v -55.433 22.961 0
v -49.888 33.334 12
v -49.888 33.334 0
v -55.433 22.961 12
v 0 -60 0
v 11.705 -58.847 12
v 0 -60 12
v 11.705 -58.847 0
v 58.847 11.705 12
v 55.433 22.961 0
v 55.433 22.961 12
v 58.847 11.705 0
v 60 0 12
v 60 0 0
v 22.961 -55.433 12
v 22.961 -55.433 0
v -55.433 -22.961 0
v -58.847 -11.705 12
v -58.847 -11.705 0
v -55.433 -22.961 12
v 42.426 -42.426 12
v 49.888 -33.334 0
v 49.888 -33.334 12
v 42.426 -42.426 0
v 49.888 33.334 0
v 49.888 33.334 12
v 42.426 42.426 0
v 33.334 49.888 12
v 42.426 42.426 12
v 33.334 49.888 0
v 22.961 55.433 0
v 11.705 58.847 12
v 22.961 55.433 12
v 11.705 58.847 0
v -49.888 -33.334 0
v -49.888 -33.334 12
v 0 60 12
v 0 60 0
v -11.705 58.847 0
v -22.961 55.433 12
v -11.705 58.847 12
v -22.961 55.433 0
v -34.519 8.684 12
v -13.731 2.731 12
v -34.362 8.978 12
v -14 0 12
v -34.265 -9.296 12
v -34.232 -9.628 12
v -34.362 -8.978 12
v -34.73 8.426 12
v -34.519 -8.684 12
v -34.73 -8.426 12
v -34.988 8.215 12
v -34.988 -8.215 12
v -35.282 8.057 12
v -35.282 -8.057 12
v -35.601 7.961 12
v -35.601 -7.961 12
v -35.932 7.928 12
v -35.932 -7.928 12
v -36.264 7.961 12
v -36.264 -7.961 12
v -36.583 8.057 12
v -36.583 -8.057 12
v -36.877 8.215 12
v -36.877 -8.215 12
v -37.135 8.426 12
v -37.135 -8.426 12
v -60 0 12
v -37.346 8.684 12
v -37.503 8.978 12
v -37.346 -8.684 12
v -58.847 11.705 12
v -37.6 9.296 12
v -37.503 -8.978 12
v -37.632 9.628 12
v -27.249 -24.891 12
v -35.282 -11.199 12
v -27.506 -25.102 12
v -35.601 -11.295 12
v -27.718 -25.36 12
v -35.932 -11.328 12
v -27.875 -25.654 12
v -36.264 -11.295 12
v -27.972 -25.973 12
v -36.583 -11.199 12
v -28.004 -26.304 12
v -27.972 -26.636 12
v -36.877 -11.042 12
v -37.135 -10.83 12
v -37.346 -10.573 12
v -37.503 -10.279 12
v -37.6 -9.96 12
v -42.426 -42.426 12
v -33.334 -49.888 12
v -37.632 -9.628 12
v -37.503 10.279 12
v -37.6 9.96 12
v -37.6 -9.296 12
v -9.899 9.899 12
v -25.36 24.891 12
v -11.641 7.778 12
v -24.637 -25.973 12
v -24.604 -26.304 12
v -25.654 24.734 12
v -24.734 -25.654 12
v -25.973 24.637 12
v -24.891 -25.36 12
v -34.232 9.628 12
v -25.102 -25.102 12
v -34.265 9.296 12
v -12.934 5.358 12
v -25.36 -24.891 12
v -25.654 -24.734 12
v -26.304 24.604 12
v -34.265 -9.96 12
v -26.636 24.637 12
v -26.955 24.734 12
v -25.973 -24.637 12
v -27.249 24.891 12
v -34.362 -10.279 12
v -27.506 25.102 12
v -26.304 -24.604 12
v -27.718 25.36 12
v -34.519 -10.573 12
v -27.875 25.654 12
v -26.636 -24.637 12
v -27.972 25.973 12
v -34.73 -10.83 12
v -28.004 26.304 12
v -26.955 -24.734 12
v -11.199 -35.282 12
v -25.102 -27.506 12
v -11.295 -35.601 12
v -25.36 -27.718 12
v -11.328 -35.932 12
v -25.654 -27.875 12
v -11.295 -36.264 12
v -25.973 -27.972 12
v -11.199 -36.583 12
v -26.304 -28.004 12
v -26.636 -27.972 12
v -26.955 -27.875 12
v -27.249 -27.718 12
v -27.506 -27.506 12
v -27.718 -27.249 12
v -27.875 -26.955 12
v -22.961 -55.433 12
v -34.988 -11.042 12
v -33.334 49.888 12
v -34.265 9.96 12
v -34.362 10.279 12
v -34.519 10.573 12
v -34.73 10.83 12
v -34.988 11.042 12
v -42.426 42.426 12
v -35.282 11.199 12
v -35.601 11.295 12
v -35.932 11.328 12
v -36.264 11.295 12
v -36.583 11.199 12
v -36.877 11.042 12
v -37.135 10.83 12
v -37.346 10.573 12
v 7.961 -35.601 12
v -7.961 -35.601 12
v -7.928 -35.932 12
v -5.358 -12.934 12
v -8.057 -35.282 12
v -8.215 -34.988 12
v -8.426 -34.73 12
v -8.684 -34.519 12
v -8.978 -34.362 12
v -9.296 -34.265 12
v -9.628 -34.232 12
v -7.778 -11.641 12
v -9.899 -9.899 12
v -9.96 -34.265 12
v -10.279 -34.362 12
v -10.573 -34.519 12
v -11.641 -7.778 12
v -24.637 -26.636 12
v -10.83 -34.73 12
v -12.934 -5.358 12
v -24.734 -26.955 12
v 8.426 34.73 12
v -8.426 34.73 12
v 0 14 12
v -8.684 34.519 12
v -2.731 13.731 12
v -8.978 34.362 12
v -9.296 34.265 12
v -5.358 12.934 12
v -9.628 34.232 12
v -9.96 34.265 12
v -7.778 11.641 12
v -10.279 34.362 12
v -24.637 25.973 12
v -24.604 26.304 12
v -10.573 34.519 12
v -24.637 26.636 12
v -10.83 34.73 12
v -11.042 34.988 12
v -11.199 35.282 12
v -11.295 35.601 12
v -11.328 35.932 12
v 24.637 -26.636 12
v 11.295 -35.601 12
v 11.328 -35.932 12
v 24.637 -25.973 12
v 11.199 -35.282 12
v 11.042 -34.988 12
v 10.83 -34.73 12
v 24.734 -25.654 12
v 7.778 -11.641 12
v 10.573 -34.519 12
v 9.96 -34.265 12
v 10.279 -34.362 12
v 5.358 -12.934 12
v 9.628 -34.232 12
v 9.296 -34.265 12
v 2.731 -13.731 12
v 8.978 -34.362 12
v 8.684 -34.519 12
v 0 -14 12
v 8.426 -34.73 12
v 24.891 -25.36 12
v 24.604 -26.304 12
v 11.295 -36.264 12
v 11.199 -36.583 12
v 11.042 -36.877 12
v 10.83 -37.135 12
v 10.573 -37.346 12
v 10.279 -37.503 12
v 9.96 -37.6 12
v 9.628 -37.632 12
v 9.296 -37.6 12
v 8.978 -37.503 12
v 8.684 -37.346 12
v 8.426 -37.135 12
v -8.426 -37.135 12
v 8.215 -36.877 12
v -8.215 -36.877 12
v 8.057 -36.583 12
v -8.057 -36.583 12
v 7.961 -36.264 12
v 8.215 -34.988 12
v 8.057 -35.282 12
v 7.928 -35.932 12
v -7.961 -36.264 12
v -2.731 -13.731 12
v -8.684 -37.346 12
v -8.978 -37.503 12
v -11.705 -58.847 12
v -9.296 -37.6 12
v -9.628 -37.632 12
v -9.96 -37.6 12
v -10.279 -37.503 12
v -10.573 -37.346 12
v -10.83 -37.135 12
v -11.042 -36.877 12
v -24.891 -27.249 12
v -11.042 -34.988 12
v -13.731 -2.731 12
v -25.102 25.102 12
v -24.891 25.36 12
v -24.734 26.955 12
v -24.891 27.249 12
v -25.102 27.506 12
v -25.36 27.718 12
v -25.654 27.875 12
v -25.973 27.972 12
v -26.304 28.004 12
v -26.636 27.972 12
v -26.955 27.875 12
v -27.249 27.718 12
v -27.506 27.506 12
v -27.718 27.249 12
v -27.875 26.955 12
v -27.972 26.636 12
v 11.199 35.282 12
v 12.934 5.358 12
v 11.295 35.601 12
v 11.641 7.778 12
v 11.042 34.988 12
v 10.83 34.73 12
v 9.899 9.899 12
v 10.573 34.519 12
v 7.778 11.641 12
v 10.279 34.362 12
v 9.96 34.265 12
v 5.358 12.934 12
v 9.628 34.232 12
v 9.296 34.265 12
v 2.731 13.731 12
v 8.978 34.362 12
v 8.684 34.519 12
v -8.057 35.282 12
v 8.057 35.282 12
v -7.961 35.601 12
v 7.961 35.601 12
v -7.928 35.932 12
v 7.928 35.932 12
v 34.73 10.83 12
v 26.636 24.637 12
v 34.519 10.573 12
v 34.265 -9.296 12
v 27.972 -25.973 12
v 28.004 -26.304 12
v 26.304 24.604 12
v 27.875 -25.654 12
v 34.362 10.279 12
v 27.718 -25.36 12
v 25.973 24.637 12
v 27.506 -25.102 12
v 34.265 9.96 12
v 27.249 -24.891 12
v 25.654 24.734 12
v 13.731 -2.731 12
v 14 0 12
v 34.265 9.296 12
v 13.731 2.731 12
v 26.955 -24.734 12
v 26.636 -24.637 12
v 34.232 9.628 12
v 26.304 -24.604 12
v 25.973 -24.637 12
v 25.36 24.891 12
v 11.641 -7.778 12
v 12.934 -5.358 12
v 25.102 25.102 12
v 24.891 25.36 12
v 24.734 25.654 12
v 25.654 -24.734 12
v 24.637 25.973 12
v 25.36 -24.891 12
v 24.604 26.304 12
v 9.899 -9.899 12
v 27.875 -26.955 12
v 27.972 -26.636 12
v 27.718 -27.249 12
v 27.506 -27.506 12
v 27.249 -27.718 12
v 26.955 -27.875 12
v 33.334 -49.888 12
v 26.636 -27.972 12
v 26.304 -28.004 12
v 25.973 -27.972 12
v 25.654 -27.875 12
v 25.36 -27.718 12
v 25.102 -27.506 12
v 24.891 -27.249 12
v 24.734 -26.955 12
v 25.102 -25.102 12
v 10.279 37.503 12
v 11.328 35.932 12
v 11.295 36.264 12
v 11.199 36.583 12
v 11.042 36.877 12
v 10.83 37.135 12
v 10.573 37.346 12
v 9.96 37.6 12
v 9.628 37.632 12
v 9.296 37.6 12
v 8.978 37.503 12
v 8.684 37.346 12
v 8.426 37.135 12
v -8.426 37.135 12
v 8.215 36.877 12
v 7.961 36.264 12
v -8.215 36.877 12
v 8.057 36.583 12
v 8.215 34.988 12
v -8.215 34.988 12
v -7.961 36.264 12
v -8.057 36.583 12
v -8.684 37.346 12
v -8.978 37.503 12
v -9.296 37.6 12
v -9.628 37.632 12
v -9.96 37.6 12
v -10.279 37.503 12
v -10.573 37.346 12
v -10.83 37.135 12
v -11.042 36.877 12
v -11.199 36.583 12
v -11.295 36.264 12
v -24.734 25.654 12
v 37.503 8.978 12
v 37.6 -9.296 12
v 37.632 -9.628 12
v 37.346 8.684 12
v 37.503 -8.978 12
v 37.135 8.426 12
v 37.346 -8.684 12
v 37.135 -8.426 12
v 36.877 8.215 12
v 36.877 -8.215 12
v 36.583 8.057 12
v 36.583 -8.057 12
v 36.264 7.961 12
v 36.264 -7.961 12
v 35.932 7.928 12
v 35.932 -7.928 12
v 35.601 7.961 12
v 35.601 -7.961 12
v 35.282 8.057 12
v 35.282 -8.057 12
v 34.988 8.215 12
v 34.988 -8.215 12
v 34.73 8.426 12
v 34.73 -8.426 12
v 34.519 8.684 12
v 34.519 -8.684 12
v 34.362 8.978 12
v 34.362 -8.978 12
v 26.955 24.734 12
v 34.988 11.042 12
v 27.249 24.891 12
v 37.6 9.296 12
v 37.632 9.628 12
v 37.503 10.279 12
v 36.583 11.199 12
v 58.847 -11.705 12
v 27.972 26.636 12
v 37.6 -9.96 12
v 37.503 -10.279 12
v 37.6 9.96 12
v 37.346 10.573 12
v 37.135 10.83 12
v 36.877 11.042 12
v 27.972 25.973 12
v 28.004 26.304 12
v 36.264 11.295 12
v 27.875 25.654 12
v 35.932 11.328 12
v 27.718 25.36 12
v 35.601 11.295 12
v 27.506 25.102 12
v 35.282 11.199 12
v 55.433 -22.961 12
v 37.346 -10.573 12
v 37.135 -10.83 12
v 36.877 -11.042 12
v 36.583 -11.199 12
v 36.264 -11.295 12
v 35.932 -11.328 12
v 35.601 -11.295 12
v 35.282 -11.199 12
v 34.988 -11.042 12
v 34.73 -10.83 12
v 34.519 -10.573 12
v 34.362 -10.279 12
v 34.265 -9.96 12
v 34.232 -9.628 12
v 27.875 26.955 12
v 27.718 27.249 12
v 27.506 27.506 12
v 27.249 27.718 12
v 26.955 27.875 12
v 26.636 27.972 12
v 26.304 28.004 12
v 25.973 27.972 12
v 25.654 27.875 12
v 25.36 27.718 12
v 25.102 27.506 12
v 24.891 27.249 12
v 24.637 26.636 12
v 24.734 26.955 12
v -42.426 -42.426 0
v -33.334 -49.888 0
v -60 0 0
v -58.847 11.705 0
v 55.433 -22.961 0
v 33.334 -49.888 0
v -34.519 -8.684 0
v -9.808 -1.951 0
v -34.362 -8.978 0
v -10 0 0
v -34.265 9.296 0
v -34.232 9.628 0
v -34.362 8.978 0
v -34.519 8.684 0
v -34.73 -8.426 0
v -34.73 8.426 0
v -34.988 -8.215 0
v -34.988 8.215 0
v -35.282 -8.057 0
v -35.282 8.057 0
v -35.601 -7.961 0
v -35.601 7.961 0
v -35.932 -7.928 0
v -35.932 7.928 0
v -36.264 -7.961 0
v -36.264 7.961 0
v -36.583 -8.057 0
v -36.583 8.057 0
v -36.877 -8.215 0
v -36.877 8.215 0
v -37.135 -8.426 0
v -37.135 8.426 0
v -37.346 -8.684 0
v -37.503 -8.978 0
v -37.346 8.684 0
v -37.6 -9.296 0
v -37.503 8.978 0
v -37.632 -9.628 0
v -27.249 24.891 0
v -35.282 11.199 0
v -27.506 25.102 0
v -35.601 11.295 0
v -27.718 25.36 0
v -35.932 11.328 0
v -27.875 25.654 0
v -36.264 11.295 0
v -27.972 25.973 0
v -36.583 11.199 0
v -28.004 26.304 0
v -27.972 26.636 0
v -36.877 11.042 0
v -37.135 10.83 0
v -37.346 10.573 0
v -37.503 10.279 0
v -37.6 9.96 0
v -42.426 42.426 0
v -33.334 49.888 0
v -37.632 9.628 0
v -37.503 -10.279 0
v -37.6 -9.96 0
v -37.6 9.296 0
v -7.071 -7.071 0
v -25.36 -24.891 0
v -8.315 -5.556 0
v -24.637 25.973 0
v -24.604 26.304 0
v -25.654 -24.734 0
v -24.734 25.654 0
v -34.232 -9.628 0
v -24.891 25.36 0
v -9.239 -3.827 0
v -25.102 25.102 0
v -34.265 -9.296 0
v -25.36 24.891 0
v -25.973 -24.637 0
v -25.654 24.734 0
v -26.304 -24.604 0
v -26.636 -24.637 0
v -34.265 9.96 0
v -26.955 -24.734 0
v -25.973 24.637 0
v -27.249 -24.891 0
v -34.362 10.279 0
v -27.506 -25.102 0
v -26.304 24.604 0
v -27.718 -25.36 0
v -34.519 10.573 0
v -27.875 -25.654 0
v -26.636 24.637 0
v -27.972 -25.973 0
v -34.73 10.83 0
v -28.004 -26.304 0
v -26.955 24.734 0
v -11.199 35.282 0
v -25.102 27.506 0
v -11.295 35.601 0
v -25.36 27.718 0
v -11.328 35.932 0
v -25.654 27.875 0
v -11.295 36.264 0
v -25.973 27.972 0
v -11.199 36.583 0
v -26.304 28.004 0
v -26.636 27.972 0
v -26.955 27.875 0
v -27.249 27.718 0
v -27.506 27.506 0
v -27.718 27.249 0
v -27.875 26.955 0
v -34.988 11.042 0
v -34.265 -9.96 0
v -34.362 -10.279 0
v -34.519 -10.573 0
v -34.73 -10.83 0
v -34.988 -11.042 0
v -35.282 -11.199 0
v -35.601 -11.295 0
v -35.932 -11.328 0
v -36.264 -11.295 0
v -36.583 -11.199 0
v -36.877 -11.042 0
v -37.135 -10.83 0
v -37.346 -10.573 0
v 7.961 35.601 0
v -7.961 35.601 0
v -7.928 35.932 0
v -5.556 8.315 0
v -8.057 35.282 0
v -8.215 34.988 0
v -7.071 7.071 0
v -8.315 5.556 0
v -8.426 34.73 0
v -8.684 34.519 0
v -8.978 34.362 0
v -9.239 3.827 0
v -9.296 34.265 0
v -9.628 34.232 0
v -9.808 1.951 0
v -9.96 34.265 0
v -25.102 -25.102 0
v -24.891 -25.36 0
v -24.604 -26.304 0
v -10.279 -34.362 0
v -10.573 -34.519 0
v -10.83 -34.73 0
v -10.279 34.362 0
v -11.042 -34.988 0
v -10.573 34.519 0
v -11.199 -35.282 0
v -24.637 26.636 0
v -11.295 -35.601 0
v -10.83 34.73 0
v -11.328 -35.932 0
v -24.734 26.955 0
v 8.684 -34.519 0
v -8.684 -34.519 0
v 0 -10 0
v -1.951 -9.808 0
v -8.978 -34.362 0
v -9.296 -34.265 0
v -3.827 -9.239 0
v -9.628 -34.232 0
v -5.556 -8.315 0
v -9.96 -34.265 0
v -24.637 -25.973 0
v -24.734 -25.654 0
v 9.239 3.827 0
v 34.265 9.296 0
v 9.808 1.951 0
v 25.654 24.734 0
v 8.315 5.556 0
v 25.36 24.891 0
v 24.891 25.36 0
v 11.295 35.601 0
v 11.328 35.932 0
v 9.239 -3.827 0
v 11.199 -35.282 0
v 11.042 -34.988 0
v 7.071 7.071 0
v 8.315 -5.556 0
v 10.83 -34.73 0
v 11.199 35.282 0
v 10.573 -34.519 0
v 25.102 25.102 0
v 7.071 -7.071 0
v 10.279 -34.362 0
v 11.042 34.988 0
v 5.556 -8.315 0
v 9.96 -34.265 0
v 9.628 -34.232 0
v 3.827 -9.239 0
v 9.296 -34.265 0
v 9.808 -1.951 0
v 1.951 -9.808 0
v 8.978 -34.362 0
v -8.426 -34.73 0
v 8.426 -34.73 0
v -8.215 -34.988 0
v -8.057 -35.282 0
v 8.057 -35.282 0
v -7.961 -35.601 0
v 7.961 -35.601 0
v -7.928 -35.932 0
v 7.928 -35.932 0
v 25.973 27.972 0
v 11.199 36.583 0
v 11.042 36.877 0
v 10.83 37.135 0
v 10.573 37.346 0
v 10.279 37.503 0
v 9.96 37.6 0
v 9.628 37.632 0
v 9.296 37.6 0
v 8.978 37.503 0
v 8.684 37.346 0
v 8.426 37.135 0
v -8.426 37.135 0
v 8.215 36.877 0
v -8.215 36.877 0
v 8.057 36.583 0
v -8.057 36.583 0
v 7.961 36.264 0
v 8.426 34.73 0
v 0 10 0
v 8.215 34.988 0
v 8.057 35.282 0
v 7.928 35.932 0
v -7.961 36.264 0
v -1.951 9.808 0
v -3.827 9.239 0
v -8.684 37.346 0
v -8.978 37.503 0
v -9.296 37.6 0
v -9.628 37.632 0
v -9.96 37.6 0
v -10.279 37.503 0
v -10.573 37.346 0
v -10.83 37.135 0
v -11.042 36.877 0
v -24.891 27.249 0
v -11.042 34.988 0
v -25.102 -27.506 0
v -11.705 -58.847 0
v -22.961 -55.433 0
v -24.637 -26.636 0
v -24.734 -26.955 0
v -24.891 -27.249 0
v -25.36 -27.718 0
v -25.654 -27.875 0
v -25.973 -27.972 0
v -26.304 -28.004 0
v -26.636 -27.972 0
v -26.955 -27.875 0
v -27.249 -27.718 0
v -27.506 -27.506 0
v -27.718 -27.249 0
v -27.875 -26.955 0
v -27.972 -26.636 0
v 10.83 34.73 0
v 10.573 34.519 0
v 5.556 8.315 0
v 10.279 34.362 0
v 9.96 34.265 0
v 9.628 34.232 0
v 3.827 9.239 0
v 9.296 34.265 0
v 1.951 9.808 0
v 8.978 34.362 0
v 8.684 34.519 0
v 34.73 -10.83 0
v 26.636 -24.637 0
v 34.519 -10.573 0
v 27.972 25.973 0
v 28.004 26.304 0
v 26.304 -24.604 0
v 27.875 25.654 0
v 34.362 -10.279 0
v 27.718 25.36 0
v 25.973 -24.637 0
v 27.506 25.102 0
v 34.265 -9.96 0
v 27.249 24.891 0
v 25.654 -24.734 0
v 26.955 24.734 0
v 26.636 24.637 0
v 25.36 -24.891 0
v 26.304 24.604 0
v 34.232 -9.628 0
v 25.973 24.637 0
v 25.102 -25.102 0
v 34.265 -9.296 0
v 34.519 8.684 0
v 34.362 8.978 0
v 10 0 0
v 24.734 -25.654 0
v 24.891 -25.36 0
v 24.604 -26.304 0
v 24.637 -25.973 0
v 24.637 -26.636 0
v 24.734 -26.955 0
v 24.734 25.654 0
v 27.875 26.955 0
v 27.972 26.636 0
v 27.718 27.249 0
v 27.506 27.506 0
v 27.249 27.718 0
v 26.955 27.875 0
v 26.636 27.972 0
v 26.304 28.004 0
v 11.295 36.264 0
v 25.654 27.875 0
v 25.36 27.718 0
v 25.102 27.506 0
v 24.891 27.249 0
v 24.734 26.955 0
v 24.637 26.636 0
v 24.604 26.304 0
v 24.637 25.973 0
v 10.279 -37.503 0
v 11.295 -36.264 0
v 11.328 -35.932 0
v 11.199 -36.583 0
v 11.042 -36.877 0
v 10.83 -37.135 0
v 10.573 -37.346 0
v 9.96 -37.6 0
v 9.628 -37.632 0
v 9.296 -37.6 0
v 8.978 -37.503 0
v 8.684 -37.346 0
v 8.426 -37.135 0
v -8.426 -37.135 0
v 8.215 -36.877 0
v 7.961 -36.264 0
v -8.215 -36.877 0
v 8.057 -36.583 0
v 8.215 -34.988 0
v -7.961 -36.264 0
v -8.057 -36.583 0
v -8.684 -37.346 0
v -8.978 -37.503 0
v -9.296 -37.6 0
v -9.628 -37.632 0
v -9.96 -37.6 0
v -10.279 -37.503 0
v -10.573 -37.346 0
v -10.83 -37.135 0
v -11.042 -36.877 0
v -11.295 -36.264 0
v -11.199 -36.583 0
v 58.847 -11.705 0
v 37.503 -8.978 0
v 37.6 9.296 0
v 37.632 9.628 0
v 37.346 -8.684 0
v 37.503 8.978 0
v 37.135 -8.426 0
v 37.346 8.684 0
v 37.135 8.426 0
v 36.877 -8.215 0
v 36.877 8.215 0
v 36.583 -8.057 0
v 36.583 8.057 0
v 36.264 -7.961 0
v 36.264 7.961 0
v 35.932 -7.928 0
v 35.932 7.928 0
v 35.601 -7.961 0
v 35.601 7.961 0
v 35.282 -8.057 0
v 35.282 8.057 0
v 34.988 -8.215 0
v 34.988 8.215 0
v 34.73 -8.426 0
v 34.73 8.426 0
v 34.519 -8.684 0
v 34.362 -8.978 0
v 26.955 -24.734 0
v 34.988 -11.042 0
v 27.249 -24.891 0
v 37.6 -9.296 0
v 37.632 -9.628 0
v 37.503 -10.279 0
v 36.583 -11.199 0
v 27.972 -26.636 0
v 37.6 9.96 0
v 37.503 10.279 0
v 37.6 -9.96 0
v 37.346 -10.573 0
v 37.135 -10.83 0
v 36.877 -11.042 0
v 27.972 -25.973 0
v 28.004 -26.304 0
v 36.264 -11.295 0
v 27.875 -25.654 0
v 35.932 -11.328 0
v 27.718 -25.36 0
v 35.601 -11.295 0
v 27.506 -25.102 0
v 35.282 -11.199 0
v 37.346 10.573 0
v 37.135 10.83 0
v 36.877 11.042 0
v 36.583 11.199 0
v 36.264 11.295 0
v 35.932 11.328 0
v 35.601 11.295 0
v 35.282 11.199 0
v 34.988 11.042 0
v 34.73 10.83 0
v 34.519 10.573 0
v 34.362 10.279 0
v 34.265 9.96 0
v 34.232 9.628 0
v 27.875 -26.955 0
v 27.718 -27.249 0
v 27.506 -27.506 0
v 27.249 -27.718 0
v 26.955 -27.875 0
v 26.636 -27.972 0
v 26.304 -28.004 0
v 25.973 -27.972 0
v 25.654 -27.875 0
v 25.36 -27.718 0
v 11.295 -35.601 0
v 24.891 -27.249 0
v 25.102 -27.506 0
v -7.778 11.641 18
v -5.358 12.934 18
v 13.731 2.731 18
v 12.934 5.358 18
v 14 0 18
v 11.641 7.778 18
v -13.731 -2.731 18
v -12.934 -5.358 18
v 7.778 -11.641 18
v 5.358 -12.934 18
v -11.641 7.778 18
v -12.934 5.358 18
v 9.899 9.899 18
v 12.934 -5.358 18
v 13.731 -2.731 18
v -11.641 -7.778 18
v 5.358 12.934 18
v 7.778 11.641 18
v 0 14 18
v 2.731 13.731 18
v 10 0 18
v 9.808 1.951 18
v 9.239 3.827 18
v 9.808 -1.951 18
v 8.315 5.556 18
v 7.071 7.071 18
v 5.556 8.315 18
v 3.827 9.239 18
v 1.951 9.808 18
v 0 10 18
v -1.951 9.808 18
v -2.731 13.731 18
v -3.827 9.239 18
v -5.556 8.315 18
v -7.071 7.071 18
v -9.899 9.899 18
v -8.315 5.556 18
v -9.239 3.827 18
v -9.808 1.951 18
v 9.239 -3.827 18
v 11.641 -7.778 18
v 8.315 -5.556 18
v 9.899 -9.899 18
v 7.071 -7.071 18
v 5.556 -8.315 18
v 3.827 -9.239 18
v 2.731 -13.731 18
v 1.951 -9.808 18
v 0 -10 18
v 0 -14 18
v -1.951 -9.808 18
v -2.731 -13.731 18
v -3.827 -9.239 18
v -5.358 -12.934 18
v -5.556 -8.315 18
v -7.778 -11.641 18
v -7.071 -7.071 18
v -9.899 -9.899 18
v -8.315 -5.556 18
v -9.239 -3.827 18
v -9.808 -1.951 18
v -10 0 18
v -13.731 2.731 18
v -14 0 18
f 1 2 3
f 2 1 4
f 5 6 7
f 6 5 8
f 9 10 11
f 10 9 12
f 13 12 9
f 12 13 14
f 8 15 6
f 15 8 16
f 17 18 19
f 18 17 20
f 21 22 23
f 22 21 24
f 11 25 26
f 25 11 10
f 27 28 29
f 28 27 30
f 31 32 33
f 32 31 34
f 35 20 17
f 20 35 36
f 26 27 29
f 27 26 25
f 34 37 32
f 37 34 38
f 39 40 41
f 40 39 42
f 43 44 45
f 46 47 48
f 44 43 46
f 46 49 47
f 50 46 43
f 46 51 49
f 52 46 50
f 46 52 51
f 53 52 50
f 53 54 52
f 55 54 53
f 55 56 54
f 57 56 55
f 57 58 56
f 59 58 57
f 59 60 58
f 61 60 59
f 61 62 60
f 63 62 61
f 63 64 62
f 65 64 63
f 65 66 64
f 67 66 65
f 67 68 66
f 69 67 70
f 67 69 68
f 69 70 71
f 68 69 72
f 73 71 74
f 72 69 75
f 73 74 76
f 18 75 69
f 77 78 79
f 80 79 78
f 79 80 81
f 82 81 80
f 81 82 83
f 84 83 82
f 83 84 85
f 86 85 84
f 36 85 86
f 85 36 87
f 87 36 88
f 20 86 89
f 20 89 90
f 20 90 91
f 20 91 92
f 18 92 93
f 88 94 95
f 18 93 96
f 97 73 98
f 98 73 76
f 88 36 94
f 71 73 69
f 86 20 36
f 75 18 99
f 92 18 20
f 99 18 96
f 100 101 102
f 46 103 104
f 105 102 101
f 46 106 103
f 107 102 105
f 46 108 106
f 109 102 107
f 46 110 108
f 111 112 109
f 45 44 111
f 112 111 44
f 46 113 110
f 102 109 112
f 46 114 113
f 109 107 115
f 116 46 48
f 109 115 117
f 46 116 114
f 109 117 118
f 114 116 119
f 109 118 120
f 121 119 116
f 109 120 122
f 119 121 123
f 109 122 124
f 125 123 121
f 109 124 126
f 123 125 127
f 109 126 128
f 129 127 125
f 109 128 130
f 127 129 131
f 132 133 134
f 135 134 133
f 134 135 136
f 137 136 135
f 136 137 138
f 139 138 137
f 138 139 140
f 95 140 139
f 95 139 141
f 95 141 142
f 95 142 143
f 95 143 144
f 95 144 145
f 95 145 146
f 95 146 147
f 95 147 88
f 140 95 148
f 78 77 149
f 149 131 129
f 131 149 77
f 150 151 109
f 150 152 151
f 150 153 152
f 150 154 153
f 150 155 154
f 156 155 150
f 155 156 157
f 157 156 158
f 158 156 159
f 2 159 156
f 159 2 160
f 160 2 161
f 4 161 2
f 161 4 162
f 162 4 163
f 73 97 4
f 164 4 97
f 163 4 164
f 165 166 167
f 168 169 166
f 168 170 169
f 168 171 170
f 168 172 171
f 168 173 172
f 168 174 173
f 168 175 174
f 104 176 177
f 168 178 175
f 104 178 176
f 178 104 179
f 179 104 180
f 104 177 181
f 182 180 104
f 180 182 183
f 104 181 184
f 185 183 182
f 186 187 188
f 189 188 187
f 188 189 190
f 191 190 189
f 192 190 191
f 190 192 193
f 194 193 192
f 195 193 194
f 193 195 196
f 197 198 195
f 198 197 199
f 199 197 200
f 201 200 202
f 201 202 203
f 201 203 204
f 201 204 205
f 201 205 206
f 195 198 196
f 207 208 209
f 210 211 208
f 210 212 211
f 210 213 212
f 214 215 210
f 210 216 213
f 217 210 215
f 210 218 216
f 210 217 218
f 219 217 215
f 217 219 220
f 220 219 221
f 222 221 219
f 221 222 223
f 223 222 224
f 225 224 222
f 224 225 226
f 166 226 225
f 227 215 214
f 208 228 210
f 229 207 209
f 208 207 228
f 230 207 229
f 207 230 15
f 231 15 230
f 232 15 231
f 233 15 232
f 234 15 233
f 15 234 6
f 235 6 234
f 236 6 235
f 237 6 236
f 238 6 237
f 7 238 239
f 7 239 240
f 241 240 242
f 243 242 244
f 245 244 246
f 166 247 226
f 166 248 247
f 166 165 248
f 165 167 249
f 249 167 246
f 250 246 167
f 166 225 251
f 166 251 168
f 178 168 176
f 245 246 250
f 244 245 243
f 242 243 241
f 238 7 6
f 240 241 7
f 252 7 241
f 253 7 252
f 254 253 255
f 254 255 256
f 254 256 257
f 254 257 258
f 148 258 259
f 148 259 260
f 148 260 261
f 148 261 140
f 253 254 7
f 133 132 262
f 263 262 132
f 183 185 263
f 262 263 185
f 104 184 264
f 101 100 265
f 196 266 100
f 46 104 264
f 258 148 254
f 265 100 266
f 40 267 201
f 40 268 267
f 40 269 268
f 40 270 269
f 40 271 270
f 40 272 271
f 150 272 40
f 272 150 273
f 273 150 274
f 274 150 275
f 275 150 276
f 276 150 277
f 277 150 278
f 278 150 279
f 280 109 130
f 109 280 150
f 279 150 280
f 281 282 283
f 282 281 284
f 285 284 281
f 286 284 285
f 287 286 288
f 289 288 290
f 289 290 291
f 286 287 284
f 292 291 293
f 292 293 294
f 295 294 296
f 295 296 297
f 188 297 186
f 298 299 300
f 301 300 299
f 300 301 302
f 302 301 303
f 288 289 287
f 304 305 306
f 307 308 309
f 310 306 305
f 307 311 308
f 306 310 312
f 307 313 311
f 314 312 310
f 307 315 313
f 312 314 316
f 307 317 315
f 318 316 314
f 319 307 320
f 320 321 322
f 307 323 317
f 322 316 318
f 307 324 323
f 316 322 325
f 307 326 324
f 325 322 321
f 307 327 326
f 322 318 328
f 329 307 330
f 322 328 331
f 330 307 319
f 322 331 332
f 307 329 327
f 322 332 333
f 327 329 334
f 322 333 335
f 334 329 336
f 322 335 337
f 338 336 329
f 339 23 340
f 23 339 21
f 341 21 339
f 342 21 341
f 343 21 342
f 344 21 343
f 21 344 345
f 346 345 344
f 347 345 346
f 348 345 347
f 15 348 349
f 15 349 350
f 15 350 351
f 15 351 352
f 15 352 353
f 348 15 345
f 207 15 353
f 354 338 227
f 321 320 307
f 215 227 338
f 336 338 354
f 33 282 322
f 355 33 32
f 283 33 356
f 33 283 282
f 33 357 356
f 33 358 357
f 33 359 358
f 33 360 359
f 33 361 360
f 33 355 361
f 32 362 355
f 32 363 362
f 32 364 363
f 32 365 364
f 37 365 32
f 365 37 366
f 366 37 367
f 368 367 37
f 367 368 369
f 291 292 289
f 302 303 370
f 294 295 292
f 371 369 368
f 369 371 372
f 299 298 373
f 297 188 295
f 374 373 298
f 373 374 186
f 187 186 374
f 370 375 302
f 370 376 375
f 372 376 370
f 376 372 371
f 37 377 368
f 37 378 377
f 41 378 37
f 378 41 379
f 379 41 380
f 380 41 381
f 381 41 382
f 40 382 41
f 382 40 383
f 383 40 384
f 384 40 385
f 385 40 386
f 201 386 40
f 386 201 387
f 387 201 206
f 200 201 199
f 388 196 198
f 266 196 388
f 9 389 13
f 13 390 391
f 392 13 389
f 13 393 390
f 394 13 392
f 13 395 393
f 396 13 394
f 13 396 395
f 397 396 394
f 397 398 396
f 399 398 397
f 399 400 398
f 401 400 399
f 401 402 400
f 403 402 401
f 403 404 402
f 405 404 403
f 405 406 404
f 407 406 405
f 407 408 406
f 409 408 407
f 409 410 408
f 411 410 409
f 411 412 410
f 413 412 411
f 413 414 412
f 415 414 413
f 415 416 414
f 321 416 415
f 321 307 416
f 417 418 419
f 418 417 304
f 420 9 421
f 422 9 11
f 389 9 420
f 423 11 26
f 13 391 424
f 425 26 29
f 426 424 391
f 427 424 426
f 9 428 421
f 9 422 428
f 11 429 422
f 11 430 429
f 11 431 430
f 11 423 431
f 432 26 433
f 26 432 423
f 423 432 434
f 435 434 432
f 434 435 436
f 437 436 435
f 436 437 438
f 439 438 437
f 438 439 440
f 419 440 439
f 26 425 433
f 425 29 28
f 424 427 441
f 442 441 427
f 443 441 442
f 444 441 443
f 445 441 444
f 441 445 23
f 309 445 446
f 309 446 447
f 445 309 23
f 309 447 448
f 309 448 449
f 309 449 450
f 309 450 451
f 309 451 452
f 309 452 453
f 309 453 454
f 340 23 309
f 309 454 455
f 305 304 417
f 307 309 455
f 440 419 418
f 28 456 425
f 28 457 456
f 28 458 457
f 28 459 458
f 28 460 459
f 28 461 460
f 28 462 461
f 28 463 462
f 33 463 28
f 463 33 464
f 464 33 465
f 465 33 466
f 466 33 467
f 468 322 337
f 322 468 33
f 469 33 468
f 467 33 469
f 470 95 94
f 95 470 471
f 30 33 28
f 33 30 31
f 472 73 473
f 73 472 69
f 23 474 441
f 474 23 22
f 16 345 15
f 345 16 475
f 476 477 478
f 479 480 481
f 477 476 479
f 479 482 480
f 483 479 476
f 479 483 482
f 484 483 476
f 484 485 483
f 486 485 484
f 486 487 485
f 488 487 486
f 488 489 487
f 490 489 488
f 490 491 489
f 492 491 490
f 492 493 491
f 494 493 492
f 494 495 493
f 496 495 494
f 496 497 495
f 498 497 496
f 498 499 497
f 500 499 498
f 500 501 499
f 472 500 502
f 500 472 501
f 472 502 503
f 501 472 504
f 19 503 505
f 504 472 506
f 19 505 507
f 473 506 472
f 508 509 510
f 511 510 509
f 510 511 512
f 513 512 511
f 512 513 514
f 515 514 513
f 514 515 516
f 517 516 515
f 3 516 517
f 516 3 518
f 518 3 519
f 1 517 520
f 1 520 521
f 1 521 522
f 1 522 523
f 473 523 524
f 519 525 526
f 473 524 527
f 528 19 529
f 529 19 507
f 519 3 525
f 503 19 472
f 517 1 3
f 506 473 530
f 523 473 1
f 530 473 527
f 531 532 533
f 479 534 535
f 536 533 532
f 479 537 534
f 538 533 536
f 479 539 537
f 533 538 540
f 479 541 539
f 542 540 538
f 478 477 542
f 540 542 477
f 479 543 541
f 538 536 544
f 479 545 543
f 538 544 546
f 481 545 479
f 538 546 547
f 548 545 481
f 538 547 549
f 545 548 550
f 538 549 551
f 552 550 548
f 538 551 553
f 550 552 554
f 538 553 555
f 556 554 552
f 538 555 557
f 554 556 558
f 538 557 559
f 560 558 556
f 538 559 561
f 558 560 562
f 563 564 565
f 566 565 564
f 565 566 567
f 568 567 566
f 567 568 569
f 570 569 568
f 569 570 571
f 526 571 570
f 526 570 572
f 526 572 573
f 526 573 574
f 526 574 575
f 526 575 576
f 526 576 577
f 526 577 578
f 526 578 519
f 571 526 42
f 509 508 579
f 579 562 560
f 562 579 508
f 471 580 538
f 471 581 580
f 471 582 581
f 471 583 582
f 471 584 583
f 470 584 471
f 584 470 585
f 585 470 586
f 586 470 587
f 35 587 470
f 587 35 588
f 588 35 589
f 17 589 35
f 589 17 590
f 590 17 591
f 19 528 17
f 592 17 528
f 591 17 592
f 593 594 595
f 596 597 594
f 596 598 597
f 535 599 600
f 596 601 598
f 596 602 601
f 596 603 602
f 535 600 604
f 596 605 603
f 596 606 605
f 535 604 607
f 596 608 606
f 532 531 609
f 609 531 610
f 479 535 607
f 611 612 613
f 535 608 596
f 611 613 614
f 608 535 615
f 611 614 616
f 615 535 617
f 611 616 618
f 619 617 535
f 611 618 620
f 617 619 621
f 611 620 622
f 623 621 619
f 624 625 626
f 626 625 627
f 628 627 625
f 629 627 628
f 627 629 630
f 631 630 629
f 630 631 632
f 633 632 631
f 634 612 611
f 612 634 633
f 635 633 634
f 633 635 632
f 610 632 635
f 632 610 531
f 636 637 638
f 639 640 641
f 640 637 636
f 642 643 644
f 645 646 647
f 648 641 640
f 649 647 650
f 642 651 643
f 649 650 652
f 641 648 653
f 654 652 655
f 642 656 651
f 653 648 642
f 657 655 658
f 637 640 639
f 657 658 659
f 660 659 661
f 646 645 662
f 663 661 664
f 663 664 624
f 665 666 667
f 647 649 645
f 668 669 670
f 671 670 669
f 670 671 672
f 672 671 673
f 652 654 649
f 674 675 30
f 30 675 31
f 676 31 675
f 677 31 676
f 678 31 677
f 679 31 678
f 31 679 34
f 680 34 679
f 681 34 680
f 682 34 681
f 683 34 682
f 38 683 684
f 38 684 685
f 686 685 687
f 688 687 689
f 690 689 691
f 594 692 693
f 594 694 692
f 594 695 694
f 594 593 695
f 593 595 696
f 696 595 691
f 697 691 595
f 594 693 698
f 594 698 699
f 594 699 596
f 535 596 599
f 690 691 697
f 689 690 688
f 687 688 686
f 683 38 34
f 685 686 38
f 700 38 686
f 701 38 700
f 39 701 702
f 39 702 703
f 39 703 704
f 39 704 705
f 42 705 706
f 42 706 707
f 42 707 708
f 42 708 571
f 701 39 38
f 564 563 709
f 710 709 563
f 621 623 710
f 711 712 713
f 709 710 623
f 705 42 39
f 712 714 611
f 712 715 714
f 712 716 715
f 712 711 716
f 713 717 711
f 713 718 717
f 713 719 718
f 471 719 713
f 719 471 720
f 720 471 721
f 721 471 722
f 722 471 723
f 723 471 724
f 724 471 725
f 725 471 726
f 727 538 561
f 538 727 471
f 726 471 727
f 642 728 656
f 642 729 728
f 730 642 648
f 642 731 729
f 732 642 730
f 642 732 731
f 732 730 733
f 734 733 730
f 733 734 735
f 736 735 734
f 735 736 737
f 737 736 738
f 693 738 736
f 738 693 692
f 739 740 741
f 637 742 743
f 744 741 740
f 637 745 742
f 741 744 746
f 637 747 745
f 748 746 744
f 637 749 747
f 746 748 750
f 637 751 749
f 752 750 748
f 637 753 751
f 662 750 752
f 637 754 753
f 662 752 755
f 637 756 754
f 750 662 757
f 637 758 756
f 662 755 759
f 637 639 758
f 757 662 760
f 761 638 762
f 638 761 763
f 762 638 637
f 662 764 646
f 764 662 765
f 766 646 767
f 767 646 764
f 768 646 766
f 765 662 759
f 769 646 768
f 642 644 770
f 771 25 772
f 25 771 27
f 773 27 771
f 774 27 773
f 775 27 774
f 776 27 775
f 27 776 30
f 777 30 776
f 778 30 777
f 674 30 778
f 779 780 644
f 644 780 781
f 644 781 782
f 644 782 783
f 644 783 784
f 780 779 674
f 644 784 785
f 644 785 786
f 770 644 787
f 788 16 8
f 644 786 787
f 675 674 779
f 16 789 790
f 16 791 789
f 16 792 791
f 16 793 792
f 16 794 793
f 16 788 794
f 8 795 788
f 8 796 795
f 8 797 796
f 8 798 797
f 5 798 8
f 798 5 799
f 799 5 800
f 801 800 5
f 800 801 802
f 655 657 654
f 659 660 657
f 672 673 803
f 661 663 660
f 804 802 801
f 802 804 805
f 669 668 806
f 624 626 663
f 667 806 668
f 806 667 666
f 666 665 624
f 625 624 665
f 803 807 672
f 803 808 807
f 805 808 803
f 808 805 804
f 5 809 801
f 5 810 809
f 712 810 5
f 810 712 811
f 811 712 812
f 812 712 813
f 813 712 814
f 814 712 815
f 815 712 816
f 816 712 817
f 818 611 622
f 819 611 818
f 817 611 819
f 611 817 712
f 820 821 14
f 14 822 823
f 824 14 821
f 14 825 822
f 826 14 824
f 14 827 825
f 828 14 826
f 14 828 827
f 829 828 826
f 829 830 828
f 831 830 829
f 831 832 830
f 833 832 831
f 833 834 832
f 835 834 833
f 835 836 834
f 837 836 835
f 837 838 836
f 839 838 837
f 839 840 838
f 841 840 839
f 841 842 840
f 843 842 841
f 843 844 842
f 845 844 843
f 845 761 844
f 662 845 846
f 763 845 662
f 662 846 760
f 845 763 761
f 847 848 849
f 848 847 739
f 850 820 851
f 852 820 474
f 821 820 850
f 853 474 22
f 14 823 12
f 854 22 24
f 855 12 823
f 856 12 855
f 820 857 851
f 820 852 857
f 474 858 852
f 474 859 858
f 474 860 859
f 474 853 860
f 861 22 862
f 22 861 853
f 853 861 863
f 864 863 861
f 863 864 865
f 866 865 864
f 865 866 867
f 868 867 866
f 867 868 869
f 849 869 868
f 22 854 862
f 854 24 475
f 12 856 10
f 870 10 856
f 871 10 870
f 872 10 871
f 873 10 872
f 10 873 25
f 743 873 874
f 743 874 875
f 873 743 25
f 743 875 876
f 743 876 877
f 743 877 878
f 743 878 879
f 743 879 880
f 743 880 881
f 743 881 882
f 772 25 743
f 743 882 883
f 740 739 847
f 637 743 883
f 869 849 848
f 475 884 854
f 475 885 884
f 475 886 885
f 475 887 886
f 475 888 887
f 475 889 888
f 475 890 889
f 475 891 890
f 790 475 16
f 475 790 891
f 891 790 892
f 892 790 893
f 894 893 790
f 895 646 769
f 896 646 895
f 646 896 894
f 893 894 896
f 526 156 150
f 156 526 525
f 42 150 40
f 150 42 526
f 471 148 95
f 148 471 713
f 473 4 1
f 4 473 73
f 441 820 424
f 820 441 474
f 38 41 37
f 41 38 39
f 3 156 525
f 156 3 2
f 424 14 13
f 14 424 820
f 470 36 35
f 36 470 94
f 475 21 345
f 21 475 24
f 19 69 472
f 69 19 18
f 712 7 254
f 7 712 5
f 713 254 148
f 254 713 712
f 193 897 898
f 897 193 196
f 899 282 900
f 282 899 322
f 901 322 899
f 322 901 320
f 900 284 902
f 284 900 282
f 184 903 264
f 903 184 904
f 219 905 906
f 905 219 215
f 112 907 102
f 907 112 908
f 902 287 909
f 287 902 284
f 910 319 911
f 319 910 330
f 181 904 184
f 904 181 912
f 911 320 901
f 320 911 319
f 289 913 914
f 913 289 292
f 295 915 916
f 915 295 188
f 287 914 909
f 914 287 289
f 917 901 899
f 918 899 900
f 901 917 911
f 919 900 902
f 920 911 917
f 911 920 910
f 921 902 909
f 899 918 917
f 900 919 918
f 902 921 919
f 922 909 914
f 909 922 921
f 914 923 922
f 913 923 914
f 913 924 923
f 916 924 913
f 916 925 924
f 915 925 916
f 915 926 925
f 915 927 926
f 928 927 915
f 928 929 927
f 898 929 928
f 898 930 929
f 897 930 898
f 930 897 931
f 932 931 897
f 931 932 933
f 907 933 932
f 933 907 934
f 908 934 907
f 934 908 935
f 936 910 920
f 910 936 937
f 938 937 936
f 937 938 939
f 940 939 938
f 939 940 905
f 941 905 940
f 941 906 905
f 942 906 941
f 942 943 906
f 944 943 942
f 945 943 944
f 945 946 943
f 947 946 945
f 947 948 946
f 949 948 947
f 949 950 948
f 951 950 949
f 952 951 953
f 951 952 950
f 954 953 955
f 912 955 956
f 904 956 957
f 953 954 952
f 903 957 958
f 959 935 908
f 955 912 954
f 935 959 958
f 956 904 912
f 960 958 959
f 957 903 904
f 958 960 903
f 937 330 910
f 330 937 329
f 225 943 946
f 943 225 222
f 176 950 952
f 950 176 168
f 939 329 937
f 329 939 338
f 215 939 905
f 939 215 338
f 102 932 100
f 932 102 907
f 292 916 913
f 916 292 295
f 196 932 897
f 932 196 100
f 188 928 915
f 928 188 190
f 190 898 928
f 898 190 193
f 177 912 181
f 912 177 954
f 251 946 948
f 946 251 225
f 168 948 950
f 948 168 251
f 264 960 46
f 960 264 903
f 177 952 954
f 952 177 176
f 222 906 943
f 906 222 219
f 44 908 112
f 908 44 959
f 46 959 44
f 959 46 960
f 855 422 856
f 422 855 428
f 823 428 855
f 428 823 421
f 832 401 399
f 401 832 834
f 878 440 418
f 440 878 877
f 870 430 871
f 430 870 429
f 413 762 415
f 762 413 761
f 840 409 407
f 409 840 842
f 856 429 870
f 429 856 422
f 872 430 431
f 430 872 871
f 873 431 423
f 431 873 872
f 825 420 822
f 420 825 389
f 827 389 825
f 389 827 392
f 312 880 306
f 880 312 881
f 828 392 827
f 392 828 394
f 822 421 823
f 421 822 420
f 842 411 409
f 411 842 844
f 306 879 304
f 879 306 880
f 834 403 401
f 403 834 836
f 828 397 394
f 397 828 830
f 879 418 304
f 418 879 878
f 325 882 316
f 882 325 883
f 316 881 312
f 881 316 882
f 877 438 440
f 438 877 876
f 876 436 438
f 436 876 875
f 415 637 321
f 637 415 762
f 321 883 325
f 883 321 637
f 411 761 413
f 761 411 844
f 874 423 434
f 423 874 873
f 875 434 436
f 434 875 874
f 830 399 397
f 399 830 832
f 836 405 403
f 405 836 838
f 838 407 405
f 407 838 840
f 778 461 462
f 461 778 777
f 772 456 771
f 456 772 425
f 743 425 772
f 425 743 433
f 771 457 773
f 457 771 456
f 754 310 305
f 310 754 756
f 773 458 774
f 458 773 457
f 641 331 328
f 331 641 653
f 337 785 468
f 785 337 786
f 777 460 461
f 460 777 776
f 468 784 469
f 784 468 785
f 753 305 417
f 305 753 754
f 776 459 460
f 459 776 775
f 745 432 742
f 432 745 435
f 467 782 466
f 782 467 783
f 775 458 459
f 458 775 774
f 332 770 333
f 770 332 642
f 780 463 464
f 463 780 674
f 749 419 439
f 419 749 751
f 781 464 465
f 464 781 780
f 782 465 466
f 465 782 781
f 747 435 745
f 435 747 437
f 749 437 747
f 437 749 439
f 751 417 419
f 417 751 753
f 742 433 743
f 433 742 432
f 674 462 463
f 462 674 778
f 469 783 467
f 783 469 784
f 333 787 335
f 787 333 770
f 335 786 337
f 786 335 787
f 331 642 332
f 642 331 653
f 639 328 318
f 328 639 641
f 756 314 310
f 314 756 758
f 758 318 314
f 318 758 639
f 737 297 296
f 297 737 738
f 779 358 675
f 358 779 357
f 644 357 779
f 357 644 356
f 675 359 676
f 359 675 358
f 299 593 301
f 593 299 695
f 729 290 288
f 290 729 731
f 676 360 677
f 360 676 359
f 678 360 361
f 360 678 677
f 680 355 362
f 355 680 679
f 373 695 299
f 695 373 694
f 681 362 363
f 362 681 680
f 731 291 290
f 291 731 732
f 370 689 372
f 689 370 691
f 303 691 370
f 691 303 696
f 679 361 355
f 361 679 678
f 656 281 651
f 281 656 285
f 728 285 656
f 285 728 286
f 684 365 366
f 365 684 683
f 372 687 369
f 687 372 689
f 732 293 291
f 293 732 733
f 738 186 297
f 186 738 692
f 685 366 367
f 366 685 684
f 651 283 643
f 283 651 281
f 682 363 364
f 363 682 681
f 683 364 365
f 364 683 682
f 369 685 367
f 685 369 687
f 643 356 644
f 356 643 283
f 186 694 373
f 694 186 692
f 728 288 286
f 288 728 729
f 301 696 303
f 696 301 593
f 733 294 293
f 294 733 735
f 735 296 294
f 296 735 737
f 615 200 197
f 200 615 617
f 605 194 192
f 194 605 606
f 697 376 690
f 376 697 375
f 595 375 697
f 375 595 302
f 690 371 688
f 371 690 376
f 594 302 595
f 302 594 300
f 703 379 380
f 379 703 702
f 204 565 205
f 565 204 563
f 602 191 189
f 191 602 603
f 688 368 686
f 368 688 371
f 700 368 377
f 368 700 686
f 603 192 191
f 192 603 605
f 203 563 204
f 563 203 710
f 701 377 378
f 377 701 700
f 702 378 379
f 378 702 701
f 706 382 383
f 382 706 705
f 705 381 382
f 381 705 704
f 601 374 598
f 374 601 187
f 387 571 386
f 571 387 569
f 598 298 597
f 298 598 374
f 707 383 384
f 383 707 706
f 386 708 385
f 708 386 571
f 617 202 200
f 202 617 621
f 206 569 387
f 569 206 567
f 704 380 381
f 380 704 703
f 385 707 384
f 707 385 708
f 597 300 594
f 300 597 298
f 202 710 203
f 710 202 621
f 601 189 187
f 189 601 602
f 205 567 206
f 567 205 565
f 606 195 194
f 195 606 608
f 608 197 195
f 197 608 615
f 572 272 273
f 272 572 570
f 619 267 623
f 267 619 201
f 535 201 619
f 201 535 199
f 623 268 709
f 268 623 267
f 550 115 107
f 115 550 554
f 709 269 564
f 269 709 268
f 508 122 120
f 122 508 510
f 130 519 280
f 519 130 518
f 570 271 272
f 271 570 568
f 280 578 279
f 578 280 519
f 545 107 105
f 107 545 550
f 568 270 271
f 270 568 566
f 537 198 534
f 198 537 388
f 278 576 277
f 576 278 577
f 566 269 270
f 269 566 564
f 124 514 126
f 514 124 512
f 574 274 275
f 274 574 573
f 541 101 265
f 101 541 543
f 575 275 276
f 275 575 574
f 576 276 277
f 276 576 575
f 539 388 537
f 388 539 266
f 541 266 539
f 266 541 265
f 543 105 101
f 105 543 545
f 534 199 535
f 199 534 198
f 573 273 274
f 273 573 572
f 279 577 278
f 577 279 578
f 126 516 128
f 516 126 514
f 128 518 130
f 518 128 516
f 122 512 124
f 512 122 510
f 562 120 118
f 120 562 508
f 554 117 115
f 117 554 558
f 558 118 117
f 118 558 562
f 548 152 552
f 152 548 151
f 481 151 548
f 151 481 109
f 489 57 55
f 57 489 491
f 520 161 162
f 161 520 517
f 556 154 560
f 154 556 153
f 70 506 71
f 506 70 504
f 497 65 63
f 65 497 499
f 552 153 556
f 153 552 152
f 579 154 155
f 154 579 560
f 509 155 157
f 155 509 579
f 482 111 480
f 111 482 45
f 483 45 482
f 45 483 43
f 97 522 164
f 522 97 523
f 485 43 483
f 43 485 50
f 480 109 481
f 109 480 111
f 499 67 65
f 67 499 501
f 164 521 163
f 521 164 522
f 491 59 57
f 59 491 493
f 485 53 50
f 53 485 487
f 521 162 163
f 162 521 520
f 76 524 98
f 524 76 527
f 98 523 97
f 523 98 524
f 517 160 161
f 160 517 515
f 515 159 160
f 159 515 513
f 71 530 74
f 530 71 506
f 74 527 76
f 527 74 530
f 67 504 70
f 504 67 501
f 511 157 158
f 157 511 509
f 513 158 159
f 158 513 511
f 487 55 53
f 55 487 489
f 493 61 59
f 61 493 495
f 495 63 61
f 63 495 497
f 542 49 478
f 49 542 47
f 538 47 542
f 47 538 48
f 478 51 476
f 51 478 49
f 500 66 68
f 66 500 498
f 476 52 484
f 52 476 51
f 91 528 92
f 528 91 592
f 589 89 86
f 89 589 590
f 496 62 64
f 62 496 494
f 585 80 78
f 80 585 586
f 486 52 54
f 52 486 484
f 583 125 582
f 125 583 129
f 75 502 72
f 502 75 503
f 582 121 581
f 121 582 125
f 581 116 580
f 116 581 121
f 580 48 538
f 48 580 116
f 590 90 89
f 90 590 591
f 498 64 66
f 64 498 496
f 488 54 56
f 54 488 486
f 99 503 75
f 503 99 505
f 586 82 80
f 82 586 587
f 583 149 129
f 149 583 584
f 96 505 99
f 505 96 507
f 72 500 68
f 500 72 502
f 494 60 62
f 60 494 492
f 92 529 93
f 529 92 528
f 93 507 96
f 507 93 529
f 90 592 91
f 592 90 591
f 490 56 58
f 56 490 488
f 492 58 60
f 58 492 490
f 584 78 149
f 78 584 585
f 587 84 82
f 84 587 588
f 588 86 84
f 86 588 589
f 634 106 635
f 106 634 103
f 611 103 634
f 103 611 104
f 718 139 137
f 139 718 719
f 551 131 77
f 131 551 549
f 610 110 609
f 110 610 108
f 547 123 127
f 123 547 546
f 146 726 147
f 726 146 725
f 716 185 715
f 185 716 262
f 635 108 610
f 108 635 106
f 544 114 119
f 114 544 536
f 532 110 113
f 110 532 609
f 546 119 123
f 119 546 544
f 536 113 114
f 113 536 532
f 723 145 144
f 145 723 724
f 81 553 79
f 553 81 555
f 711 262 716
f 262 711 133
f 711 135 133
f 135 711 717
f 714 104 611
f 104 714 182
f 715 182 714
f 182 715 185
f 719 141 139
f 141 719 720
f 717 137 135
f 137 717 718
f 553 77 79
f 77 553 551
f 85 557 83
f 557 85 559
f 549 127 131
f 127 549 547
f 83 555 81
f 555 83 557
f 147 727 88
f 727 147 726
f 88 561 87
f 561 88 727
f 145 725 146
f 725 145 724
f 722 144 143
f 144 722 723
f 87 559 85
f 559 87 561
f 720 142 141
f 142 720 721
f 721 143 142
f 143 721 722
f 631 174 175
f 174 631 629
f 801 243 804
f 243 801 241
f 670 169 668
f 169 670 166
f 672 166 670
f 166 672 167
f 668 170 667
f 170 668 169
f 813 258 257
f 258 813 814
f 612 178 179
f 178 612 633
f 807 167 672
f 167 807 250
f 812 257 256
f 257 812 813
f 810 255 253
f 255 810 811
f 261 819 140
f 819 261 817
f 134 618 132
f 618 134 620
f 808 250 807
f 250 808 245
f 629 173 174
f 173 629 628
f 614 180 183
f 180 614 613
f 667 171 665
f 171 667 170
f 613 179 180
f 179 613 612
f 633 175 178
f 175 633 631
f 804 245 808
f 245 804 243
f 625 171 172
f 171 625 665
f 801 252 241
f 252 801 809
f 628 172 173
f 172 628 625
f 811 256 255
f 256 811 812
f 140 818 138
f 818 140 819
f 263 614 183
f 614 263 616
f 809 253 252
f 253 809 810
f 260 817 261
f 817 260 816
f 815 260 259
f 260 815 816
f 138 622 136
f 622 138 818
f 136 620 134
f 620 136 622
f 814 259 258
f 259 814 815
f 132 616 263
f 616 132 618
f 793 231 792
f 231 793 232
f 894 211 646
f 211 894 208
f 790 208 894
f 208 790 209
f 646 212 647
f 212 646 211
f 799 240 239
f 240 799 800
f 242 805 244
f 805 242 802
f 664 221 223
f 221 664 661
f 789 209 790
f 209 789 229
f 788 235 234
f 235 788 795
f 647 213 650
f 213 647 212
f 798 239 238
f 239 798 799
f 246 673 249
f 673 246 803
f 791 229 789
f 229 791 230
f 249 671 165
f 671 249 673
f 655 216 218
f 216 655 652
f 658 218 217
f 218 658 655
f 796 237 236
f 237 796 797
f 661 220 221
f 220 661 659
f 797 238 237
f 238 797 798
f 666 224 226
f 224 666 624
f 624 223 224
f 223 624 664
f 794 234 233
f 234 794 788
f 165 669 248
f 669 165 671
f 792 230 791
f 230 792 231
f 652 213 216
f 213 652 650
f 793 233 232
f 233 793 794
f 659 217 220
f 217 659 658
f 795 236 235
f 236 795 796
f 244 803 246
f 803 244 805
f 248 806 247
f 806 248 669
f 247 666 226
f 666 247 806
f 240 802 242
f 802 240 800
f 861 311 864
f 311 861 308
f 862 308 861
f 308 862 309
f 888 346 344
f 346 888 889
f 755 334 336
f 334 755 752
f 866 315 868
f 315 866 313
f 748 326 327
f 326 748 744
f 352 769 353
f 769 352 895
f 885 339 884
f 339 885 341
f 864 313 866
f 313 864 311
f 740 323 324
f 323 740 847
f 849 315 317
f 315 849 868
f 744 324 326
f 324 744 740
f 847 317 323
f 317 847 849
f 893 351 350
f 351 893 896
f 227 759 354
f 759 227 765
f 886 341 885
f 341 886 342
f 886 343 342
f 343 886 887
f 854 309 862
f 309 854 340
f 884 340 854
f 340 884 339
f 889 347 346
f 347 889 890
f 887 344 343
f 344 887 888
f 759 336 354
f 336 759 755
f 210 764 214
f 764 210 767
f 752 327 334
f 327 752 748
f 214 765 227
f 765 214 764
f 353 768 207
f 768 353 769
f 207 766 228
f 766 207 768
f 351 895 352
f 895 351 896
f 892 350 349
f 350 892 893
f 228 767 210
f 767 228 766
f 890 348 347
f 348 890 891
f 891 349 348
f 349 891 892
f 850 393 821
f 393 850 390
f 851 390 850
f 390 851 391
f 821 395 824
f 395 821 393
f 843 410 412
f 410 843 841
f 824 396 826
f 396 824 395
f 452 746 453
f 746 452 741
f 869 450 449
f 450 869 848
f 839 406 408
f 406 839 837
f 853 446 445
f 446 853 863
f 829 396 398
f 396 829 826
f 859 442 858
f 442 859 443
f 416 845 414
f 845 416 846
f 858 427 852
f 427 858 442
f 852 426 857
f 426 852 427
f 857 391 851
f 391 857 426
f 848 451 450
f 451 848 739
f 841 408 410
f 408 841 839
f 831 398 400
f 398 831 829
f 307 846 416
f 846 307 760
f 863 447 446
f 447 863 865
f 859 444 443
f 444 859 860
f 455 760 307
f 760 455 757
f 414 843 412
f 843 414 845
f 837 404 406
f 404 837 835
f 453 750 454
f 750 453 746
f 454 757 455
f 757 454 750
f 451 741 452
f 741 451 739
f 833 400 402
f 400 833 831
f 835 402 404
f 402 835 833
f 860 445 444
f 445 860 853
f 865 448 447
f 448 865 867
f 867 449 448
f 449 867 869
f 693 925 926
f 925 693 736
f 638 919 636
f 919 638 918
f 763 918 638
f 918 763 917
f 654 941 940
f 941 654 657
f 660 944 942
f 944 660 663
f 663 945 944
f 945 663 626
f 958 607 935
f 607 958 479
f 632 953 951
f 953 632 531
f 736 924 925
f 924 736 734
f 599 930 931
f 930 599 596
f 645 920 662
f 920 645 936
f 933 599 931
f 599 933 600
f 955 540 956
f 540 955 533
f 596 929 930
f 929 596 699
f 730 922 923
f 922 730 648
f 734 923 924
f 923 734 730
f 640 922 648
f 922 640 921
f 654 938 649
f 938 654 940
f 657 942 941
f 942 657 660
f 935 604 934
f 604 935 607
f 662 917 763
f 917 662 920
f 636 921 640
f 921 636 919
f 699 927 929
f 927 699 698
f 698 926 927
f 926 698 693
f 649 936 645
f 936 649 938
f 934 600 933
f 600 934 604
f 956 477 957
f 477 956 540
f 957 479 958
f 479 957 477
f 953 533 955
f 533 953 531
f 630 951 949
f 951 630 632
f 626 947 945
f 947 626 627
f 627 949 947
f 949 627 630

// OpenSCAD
$fn = 32;

// ----------------------------------------------------------------------
// Flange Ø120 x 12
// 12 holes on a Ø74.4 bolt circle, bolted joints
// ----------------------------------------------------------------------

// --- parameters (mm) ---
flange_d = 120;  // outside diameter of the flange
thickness = 12;  // flange thickness
holes = 12;      // number of bolt holes
pcd = 74.4;      // bolt circle diameter
start_deg = 15;  // angle of the first hole, from +X
hole_d = 3.4;    // bolt hole diameter
bore_d = 20;     // central through bore
hub_d = 28;      // hub outside diameter
hub_h = 6;       // hub height above the flange face (0 = no hub)

// --- derived feature positions (mm) ---
height = thickness + hub_h;  // = 18   overall height of the part
pcd_r = pcd / 2;             // = 37.2   bolt circle radius
hole_step = 360 / holes;     // = 30   angular pitch
feature_centers = [
  [pcd_r * cos(start_deg + 0 * hole_step), pcd_r * sin(start_deg + 0 * hole_step)],
  [pcd_r * cos(start_deg + 1 * hole_step), pcd_r * sin(start_deg + 1 * hole_step)],
  [pcd_r * cos(start_deg + 2 * hole_step), pcd_r * sin(start_deg + 2 * hole_step)],
  [pcd_r * cos(start_deg + 3 * hole_step), pcd_r * sin(start_deg + 3 * hole_step)],
  [pcd_r * cos(start_deg + 4 * hole_step), pcd_r * sin(start_deg + 4 * hole_step)],
  [pcd_r * cos(start_deg + 5 * hole_step), pcd_r * sin(start_deg + 5 * hole_step)],
  [pcd_r * cos(start_deg + 6 * hole_step), pcd_r * sin(start_deg + 6 * hole_step)],
  [pcd_r * cos(start_deg + 7 * hole_step), pcd_r * sin(start_deg + 7 * hole_step)],
  [pcd_r * cos(start_deg + 8 * hole_step), pcd_r * sin(start_deg + 8 * hole_step)],
  [pcd_r * cos(start_deg + 9 * hole_step), pcd_r * sin(start_deg + 9 * hole_step)],
  [pcd_r * cos(start_deg + 10 * hole_step), pcd_r * sin(start_deg + 10 * hole_step)],
  [pcd_r * cos(start_deg + 11 * hole_step), pcd_r * sin(start_deg + 11 * hole_step)]
];   // bolt hole centres on the pitch circle

// flange disc, every hole and the bore cut straight through
difference() {
  union() {
    cylinder(d = flange_d, h = thickness);
    cylinder(d = hub_d, h = height);  // hub, overlapped into the flange
  }
  translate([0, 0, -1]) cylinder(d = bore_d, h = height + 2);  // bore, through
  for (centre = feature_centers)
    translate([centre[0], centre[1], -1]) cylinder(d = hole_d, h = thickness + 2);
}
